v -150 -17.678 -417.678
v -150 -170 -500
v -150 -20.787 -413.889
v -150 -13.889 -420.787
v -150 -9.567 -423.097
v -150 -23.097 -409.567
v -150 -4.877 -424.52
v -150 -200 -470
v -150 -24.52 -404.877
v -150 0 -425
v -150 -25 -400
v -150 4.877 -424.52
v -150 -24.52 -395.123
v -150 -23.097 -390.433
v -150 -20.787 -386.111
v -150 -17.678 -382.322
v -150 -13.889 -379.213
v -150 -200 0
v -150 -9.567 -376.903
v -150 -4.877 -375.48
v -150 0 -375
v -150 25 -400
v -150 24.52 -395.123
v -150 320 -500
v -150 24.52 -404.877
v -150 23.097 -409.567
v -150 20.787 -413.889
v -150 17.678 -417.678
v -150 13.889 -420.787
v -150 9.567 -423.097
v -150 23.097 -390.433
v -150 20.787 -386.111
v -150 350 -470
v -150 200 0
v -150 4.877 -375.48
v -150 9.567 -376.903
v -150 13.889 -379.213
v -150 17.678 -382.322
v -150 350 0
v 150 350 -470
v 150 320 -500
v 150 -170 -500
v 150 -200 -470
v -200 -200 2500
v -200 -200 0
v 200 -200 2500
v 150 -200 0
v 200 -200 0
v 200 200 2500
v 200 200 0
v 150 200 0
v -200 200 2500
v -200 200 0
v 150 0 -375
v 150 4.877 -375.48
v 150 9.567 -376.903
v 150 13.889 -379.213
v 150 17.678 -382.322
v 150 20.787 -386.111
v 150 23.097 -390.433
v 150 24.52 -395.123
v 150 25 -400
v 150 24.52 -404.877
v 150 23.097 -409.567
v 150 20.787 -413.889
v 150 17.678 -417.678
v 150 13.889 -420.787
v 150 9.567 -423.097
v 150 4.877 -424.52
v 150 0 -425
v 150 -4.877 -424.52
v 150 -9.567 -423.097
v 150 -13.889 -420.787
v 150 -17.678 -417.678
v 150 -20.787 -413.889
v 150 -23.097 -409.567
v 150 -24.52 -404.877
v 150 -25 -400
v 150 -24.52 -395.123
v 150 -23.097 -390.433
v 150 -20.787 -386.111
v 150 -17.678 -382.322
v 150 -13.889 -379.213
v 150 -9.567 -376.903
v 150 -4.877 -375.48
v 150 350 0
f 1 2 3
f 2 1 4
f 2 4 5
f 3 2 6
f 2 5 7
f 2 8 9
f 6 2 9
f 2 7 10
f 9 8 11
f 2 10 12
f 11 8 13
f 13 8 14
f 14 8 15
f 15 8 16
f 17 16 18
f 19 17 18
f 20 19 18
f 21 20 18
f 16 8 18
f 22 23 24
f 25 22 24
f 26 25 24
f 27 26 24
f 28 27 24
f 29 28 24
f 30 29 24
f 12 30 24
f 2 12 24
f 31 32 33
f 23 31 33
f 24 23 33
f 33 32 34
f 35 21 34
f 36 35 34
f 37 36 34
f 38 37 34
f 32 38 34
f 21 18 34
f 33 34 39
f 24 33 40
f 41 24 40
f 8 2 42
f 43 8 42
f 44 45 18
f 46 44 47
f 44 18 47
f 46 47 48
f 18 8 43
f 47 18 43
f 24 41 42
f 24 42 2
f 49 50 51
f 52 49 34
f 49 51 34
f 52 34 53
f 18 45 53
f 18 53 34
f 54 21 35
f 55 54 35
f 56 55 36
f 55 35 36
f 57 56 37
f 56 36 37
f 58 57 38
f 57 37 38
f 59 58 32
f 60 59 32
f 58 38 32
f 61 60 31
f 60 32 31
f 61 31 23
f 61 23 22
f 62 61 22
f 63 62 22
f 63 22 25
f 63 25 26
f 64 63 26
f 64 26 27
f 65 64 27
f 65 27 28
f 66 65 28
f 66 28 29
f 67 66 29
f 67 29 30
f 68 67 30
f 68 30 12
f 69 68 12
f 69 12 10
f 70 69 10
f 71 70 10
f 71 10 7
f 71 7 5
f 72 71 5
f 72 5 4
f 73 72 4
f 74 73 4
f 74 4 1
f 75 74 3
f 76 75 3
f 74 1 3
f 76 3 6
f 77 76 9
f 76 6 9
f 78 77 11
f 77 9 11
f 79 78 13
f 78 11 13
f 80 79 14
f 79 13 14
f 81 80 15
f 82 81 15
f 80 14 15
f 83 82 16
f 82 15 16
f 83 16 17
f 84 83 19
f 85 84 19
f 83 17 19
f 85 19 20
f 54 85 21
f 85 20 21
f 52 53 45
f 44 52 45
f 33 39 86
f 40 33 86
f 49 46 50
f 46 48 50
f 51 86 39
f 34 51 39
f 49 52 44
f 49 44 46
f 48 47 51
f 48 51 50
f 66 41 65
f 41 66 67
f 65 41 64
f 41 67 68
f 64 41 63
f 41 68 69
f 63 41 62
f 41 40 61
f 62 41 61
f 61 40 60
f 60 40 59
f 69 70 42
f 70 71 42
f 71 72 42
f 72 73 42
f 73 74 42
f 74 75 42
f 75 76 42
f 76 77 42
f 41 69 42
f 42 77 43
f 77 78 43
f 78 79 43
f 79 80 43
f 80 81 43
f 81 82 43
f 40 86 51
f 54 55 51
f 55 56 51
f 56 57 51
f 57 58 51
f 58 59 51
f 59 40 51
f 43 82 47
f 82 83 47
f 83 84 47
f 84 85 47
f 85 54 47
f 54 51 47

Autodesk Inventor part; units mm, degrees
ref_plane "YZ Plane" through (0, 0, 0) normal (1, 0, 0) x (0, 1, 0)
ref_plane "XZ Plane" through (0, 0, 0) normal (0, 1, 0) x (-1, 0, 0)
ref_plane "XY Plane" through (0, 0, 0) normal (0, 0, 1) x (1, 0, 0)
sketch "Náčrt1" plane through (0, 0, 0) normal (0, 0, 1) x (1, 0, 0)
  line L0 (-200, -200) -> (200, -200)
  line L1 (200, -200) -> (200, 200)
  line L2 (200, 200) -> (-200, 200)
  line L3 (-200, 200) -> (-200, -200)
  line L4 (-200, -200) -> (200, 200) construction
  line L5 (200, -200) -> (-200, 200) construction
  point P0 (0, 0)
  dimension "d0" = 400
  dimension "d1" = 400
extrude "Vysunutí1" add sketch "Náčrt1" along normal blind 2500
sketch "Náčrt2" plane through (0, 0, 0) normal (0, 0, -1) x (-1, 0, 0)
  line L0 (200, -200) -> (-200, -200) projected
  line L1 (150, 350) -> (-150, 350)
  line L2 (-150, 350) -> (-150, -200)
  line L3 (-150, -200) -> (150, -200)
  line L4 (150, -200) -> (150, 350)
  line L5 (150, 350) -> (-150, -200) construction
  line L6 (-150, 350) -> (150, -200) construction
  point P0 (0, 75)
  point P1 (0, 0)
  dimension "d15" = 300
  dimension "d16" = 550
extrude "Vysunutí2" add sketch "Náčrt2" along normal blind 500
sketch "Náčrt4" plane through (-150, 200, 0) normal (-1, 0, 0) x (0, 0, 1)
  circle A0 centre (-400, -200) radius 25
  line L0 (0, 0) -> (0, -400) projected
  line L1 (0, -200) -> (-500.4879, -200) construction
  line L2 (-500, -400) -> (-500, 150) projected
  dimension "d17" = 50
  dimension "d18" = 100
extrude "Vysunutí4" cut sketch "Náčrt4" against normal blind 500
chamfer "Zkosení2" distance 30 angle 45 2 edges at (0, -200, -500) (0, 350, -500)
properties part number "B4-Z"
